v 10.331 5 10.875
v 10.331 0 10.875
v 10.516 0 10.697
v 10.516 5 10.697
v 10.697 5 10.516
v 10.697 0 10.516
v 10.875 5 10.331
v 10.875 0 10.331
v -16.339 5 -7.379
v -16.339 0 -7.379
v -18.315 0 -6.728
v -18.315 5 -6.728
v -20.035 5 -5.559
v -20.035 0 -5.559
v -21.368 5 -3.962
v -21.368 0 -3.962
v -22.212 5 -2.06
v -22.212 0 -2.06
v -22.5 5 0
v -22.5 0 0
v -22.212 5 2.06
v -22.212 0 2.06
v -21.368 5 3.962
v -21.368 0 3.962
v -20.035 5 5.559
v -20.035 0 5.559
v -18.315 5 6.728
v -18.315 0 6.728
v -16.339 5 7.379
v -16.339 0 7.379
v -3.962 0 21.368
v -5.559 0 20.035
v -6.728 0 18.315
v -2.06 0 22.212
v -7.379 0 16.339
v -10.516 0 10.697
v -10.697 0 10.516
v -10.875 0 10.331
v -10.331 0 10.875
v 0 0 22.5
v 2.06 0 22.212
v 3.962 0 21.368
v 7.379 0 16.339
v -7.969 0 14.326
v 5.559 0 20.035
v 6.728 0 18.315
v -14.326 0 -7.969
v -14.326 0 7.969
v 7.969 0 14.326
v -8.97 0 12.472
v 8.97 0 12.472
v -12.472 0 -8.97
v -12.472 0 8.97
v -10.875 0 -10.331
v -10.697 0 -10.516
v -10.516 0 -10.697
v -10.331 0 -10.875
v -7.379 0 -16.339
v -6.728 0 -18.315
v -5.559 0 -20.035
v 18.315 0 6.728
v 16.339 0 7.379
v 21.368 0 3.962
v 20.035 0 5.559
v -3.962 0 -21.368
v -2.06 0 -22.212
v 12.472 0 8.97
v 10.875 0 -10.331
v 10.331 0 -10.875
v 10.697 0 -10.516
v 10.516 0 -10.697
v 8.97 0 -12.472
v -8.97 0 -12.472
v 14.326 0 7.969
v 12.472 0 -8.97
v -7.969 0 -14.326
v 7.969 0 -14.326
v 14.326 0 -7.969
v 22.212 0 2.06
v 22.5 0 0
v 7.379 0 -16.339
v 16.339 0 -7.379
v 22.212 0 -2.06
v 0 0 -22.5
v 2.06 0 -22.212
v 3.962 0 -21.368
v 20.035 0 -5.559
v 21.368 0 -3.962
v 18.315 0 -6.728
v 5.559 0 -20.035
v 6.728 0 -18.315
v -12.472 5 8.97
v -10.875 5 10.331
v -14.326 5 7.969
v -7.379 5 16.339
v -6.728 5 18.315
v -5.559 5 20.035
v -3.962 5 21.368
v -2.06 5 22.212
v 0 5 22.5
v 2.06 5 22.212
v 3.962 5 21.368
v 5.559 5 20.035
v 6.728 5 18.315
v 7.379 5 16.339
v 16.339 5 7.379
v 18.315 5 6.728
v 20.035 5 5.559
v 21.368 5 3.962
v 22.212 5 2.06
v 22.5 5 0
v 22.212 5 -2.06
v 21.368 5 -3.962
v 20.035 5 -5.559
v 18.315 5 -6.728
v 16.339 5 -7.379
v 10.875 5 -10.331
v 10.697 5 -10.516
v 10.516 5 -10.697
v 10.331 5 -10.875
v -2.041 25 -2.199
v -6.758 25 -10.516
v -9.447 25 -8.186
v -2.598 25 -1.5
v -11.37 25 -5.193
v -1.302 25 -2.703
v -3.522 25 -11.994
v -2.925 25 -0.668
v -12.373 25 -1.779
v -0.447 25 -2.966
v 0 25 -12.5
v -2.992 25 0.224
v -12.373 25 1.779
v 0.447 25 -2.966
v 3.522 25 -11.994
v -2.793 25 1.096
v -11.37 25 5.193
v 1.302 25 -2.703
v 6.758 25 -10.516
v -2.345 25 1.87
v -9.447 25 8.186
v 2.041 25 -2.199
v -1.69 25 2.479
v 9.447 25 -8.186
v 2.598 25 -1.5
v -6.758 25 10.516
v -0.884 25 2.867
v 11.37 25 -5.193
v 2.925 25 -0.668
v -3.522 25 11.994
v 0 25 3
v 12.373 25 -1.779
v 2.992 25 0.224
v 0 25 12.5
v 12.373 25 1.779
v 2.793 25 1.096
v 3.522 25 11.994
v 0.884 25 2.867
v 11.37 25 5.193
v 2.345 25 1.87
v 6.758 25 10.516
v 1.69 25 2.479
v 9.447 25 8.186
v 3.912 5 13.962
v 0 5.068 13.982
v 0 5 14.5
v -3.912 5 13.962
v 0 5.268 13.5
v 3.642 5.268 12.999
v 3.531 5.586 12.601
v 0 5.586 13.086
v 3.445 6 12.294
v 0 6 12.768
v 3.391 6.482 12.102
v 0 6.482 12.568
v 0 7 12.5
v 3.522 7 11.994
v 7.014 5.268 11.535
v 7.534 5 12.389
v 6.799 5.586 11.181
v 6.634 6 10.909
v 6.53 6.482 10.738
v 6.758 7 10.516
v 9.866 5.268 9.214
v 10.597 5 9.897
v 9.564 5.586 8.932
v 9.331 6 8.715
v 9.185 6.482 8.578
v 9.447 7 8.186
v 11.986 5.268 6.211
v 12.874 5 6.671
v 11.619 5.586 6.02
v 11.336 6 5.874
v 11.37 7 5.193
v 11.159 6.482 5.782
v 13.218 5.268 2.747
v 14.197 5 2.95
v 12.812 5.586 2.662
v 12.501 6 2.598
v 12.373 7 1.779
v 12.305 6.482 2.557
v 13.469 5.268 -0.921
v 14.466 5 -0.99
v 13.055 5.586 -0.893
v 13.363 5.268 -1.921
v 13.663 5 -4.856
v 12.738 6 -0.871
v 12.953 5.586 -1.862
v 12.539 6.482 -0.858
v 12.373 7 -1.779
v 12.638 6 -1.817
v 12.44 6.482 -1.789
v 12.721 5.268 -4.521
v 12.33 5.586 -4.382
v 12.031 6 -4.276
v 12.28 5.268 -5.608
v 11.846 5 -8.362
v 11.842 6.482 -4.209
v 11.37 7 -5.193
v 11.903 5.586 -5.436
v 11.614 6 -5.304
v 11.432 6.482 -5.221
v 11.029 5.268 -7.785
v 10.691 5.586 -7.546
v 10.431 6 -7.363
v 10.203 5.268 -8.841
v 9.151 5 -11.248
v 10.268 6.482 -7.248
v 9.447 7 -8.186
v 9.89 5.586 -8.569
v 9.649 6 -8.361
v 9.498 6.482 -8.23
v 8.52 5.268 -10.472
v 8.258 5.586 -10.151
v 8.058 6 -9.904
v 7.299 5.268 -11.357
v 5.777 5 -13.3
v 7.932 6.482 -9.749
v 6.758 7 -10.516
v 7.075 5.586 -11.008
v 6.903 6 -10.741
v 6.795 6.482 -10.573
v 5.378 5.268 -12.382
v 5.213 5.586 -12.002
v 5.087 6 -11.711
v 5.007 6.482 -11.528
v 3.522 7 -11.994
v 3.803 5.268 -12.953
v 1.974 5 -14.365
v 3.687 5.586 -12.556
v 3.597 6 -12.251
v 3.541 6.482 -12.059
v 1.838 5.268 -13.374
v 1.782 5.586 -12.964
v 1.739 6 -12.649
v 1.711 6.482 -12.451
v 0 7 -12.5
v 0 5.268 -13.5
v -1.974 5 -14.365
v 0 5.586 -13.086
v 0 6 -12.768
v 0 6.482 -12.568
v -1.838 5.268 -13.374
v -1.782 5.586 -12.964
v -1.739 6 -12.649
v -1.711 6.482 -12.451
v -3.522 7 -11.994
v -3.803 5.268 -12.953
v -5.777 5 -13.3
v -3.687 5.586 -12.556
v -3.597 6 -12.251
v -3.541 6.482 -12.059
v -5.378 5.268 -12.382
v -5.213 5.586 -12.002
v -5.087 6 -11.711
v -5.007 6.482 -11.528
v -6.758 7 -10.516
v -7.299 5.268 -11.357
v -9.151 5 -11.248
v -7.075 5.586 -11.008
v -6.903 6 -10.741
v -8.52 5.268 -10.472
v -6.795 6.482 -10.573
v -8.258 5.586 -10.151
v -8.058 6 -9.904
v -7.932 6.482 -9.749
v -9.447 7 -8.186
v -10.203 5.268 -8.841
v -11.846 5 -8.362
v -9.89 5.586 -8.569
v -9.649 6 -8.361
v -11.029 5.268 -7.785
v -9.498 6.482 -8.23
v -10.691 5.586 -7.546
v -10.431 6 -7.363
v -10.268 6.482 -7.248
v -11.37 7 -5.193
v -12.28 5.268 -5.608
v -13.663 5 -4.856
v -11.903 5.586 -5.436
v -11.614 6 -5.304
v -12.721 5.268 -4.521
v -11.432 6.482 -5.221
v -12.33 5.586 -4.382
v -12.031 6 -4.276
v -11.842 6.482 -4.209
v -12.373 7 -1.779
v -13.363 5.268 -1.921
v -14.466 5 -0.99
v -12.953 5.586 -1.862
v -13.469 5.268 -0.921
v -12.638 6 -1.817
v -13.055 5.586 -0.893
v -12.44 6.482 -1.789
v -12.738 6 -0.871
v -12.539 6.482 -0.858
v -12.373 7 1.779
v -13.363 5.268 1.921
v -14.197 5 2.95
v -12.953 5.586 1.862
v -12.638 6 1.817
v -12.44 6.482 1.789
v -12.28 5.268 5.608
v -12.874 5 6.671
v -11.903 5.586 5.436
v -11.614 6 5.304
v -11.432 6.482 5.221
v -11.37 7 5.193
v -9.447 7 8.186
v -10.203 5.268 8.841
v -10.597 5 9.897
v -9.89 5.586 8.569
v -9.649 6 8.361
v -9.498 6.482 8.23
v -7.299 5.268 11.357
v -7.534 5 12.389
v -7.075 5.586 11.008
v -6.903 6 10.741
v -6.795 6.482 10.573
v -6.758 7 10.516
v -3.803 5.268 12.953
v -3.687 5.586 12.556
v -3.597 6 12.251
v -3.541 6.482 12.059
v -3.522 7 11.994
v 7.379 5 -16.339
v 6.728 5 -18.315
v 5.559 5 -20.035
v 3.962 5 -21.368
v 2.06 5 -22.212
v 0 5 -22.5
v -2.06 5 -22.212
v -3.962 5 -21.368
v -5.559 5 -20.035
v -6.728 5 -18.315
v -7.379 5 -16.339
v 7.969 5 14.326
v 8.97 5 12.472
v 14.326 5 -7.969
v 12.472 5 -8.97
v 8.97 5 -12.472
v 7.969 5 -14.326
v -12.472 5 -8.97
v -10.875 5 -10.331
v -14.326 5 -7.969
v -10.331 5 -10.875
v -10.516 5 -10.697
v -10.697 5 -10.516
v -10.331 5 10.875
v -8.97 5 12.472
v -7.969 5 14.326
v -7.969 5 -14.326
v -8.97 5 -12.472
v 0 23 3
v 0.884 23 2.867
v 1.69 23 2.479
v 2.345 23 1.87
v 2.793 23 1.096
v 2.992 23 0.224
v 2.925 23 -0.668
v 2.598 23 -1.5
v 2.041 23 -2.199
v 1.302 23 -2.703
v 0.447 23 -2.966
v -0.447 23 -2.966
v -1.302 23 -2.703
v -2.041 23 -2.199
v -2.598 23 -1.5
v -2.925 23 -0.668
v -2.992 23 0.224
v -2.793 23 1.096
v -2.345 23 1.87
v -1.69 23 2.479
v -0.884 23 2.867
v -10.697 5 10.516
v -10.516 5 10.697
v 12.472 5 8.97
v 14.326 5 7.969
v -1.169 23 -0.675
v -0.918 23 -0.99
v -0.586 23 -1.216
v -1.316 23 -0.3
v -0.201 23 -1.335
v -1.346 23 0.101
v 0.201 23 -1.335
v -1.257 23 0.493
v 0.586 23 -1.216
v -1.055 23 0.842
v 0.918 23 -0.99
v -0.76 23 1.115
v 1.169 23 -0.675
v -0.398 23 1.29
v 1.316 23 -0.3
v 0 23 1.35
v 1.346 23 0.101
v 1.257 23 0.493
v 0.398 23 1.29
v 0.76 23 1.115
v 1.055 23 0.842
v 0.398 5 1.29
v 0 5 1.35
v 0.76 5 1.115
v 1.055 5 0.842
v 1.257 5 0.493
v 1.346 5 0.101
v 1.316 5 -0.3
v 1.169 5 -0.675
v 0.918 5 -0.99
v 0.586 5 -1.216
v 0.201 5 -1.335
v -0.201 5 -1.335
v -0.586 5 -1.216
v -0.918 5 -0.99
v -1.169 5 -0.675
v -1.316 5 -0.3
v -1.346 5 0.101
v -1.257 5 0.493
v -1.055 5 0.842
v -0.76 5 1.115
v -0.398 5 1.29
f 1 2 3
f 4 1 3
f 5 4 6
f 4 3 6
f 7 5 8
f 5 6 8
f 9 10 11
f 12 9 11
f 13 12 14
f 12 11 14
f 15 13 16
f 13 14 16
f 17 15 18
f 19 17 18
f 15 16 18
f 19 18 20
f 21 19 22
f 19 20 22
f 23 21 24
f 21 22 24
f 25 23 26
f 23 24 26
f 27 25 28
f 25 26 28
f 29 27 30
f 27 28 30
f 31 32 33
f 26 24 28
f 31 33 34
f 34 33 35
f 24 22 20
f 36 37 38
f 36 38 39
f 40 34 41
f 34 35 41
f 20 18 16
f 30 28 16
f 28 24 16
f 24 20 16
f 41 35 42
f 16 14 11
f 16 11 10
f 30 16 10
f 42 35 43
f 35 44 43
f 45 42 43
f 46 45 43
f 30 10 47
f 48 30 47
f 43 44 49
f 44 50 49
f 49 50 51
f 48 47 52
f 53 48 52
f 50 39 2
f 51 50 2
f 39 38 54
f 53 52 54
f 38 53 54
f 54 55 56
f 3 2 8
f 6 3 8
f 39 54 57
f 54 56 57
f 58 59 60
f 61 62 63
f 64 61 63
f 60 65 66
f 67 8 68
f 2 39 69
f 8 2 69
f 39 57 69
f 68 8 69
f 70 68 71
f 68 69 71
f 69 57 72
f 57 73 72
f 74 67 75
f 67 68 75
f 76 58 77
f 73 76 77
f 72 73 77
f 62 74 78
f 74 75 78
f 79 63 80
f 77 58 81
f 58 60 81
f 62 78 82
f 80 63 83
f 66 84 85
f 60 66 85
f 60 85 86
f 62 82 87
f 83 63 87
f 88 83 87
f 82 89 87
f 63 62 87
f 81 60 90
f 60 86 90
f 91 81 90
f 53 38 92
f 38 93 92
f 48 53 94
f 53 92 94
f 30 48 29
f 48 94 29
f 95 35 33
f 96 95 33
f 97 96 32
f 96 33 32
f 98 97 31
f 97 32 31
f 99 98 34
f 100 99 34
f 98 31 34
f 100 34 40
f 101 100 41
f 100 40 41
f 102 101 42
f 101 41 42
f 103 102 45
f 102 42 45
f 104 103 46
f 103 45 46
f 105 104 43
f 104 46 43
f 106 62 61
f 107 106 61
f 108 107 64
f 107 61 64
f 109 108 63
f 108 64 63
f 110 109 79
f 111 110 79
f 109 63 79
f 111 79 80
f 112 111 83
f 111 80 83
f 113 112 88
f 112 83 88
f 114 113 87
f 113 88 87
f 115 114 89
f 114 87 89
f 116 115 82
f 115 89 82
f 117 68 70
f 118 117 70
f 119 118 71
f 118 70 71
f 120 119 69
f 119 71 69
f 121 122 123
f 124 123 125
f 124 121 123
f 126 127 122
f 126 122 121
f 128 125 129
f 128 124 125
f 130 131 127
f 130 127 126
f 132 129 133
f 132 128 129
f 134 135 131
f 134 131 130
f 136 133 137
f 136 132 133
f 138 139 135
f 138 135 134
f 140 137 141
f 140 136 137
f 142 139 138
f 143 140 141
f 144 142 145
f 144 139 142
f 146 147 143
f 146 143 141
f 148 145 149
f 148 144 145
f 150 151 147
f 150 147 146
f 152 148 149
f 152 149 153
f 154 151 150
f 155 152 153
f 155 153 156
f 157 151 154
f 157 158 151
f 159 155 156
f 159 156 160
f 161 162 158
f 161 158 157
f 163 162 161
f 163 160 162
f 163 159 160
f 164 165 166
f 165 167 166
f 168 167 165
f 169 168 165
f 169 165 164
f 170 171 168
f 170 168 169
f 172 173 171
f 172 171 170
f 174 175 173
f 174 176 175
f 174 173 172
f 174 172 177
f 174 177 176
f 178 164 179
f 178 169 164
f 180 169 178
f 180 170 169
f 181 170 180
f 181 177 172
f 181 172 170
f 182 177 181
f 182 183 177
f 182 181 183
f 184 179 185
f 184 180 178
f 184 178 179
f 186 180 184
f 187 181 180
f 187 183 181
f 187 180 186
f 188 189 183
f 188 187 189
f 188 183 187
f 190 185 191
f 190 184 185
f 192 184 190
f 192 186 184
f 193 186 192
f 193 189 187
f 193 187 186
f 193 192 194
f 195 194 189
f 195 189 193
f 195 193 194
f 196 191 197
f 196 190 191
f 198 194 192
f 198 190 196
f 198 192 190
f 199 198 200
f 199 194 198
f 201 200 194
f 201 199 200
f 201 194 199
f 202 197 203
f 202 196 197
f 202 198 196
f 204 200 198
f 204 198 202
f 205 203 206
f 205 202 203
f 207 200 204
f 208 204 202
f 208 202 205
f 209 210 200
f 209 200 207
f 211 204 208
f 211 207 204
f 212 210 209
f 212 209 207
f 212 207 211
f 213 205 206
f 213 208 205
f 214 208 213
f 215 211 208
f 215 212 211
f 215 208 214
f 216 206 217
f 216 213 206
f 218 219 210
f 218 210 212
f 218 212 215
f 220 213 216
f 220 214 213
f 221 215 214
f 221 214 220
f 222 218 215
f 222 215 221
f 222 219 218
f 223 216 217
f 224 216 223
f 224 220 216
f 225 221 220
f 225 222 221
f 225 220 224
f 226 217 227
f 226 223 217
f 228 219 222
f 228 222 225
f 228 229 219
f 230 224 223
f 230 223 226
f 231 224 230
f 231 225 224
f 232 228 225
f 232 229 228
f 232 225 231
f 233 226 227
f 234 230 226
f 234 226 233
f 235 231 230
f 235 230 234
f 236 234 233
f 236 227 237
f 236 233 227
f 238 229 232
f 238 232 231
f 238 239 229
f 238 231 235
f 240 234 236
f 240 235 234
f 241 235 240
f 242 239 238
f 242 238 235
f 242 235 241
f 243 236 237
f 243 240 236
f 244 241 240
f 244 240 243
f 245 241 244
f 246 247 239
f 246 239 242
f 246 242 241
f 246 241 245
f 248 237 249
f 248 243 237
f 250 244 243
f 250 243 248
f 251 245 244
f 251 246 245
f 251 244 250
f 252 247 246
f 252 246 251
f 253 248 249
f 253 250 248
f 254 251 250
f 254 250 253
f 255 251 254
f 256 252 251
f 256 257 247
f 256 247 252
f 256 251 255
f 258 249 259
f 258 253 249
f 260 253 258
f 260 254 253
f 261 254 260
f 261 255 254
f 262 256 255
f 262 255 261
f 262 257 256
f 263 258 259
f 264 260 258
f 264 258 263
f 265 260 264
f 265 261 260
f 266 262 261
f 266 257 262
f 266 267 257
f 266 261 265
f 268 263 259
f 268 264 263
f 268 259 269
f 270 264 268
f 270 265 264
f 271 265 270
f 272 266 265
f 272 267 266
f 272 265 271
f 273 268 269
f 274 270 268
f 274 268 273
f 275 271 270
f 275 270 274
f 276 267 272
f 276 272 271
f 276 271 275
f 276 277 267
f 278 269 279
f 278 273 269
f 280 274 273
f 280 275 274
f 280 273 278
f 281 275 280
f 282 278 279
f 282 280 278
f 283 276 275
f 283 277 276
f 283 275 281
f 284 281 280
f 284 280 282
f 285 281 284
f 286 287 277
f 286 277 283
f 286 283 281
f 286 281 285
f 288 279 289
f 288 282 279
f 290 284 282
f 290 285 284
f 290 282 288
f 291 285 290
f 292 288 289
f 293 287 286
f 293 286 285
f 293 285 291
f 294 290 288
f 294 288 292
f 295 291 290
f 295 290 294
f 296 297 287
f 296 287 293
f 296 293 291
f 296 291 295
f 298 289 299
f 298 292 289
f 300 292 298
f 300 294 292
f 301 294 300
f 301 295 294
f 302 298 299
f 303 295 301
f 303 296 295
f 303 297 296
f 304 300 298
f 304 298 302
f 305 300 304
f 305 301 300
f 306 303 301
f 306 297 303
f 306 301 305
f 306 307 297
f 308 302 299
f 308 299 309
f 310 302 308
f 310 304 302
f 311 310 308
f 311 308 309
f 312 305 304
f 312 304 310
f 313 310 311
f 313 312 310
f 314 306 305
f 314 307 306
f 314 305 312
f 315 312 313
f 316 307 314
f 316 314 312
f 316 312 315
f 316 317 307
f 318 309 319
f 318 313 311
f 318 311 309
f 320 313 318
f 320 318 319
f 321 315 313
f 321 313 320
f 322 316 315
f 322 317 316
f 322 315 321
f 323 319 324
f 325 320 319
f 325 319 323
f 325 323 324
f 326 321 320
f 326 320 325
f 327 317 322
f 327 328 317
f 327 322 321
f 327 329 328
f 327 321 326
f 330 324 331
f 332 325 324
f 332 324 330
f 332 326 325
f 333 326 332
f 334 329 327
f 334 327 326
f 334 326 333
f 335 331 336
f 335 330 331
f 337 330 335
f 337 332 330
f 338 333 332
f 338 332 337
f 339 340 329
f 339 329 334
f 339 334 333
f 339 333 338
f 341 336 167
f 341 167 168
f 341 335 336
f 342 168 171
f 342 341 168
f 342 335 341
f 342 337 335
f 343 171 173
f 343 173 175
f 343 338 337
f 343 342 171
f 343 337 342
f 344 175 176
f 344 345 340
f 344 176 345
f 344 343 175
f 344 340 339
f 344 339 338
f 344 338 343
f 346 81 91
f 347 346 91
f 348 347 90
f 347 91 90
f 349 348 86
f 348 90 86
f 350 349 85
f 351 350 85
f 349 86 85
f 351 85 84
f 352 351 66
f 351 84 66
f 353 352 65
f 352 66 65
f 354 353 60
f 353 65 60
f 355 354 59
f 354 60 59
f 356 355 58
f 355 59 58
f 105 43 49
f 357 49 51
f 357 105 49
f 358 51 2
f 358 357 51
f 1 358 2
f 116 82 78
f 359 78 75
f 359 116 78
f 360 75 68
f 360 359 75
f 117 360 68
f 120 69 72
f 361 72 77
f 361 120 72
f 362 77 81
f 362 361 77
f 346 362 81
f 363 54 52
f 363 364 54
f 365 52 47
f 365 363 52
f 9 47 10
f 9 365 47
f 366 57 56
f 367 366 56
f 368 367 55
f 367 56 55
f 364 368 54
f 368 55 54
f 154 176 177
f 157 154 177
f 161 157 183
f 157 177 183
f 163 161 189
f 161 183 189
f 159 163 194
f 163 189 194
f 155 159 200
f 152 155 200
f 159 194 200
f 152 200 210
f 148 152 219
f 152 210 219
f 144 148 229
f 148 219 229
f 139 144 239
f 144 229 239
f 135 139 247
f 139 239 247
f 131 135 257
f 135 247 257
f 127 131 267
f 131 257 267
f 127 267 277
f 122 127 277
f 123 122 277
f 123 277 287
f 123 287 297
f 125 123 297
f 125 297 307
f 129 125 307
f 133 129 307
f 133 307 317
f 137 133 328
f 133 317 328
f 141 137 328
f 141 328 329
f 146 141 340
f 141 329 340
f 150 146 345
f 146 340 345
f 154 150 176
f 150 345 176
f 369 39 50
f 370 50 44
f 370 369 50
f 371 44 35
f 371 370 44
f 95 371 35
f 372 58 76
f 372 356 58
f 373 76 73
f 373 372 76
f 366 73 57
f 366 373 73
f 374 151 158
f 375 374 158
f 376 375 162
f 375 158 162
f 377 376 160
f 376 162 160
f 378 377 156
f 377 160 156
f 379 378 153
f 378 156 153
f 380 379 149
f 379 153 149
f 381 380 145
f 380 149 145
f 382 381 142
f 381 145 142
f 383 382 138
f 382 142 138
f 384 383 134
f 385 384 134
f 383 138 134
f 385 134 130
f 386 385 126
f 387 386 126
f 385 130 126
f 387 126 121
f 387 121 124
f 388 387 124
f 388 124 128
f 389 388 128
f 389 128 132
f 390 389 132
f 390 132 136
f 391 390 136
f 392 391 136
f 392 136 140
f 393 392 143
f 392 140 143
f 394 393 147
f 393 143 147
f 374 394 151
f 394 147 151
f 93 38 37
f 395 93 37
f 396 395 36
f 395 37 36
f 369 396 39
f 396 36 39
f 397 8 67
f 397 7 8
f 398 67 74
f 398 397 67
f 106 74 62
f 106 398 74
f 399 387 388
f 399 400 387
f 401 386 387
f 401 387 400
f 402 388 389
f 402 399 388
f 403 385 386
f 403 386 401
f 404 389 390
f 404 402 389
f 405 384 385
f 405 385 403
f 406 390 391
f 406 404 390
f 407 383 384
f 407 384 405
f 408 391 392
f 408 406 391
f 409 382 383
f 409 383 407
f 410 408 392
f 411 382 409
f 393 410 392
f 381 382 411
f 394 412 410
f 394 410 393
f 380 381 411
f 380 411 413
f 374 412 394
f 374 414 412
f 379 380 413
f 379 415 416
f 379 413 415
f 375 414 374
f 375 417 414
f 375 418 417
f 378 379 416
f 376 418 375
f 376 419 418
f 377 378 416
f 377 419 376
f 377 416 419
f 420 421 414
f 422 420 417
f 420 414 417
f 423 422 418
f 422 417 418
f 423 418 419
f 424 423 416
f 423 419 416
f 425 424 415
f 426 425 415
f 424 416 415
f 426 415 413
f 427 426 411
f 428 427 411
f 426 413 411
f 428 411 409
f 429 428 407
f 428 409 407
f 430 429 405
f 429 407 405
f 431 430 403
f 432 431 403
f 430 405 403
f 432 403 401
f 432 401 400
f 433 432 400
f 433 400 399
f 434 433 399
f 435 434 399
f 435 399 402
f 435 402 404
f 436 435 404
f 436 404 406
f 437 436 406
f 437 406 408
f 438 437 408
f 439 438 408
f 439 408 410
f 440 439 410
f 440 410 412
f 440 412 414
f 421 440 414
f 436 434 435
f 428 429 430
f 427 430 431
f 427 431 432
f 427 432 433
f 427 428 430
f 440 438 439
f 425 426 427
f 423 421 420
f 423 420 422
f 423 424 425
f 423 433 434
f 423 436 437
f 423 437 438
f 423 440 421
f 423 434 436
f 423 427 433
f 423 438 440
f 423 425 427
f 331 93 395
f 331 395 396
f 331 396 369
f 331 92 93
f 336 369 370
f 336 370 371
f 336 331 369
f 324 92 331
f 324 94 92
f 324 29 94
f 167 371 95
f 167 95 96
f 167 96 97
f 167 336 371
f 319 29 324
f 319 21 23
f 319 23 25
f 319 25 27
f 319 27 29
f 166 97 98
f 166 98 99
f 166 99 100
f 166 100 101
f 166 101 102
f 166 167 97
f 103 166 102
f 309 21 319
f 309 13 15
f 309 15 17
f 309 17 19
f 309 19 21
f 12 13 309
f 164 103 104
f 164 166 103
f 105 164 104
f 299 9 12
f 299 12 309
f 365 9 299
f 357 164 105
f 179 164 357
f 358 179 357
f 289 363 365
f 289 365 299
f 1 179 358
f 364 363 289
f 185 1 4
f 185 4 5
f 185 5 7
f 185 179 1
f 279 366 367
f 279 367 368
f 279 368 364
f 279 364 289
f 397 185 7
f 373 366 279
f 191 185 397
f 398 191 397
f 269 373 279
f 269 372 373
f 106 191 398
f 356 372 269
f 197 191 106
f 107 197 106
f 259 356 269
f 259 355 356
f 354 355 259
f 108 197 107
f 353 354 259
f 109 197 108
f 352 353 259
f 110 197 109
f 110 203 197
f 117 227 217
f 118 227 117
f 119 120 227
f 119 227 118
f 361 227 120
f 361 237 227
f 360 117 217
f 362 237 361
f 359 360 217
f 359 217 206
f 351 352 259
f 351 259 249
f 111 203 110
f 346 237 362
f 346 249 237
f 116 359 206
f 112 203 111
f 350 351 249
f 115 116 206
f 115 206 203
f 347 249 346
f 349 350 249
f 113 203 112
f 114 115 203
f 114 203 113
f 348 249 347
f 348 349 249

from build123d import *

# Parameters (mm, degrees)
BOSS_EXTRUDE1_DEPTH = 5
FILLET1_R           = 10
SKETCH3_R           = 12.5
BOSS_EXTRUDE2_DEPTH = 20
SKETCH4_R           = 1.35
CUT_EXTRUDE1_DEPTH  = 20
SKETCH5_R           = 3
CUT_EXTRUDE2_DEPTH  = 2
FILLET3_R           = 2


with BuildPart() as part:
    # Sketch2 → Boss-Extrude1 (new body)
    with BuildSketch(Plane(origin=(0, 0, 0), x_dir=(1, 0, 0), z_dir=(0, 1, 0))):
        with BuildLine():
            ThreePointArc((-13.125, -7.261843774), (-10.606601718, -10.606601718), (-7.261843774, -13.125))
            ThreePointArc((-7.261843774, -13.125), (0, -22.5), (7.261843774, -13.125))
            ThreePointArc((7.261843774, -13.125), (10.606601718, -10.606601718), (13.125, -7.261843774))
            ThreePointArc((13.125, -7.261843774), (22.5, 0), (13.125, 7.261843774))
            ThreePointArc((13.125, 7.261843774), (10.606601718, 10.606601718), (7.261843774, 13.125))
            ThreePointArc((7.261843774, 13.125), (0, 22.5), (-7.261843774, 13.125))
            ThreePointArc((-7.261843774, 13.125), (-10.606601718, 10.606601718), (-13.125, 7.261843774))
            ThreePointArc((-13.125, 7.261843774), (-22.5, 0), (-13.125, -7.261843774))
        make_face()
    extrude(amount=BOSS_EXTRUDE1_DEPTH)

    # Fillet1
    fillet1_edges = [part.edges().sort_by_distance(p)[0] for p in [
        (-13.125, 2.5, 7.261843774),
        (-13.125, 2.5, -7.261843774),
        (-7.261843774, 2.5, -13.125),
        (7.261843774, 2.5, -13.125),
        (13.125, 2.5, -7.261843774),
        (13.125, 2.5, 7.261843774),
        (7.261843774, 2.5, 13.125),
        (-7.261843774, 2.5, 13.125),
    ]]
    fillet(fillet1_edges, radius=FILLET1_R)

    # Sketch3 → Boss-Extrude2 (add)
    with BuildSketch(Plane(origin=(0, 5, 0), x_dir=(1, 0, 0), z_dir=(0, 1, 0))):
        with Locations(Location((0, 0, 0), (0, 0, 270))):
            Circle(SKETCH3_R)
    extrude(amount=BOSS_EXTRUDE2_DEPTH)

    # Sketch4 → Cut-Extrude1 (cut)
    with BuildSketch(Plane(origin=(0, 25, 0), x_dir=(1, 0, 0), z_dir=(0, 1, 0))):
        with Locations(Location((0, 0, 0), (0, 0, 270))):
            Circle(SKETCH4_R)
    extrude(amount=-CUT_EXTRUDE1_DEPTH, mode=Mode.SUBTRACT)

    # Sketch5 → Cut-Extrude2 (cut)
    with BuildSketch(Plane(origin=(0, 25, 0), x_dir=(1, 0, 0), z_dir=(0, 1, 0))):
        with Locations(Location((0, 0, 0), (0, 0, 270))):
            Circle(SKETCH5_R)
    extrude(amount=-CUT_EXTRUDE2_DEPTH, mode=Mode.SUBTRACT)

    # Fillet3
    fillet3_edges = [part.edges().sort_by_distance(p)[0] for p in [
        (0, 5, -12.5),
    ]]
    fillet(fillet3_edges, radius=FILLET3_R)


solid = part.part
